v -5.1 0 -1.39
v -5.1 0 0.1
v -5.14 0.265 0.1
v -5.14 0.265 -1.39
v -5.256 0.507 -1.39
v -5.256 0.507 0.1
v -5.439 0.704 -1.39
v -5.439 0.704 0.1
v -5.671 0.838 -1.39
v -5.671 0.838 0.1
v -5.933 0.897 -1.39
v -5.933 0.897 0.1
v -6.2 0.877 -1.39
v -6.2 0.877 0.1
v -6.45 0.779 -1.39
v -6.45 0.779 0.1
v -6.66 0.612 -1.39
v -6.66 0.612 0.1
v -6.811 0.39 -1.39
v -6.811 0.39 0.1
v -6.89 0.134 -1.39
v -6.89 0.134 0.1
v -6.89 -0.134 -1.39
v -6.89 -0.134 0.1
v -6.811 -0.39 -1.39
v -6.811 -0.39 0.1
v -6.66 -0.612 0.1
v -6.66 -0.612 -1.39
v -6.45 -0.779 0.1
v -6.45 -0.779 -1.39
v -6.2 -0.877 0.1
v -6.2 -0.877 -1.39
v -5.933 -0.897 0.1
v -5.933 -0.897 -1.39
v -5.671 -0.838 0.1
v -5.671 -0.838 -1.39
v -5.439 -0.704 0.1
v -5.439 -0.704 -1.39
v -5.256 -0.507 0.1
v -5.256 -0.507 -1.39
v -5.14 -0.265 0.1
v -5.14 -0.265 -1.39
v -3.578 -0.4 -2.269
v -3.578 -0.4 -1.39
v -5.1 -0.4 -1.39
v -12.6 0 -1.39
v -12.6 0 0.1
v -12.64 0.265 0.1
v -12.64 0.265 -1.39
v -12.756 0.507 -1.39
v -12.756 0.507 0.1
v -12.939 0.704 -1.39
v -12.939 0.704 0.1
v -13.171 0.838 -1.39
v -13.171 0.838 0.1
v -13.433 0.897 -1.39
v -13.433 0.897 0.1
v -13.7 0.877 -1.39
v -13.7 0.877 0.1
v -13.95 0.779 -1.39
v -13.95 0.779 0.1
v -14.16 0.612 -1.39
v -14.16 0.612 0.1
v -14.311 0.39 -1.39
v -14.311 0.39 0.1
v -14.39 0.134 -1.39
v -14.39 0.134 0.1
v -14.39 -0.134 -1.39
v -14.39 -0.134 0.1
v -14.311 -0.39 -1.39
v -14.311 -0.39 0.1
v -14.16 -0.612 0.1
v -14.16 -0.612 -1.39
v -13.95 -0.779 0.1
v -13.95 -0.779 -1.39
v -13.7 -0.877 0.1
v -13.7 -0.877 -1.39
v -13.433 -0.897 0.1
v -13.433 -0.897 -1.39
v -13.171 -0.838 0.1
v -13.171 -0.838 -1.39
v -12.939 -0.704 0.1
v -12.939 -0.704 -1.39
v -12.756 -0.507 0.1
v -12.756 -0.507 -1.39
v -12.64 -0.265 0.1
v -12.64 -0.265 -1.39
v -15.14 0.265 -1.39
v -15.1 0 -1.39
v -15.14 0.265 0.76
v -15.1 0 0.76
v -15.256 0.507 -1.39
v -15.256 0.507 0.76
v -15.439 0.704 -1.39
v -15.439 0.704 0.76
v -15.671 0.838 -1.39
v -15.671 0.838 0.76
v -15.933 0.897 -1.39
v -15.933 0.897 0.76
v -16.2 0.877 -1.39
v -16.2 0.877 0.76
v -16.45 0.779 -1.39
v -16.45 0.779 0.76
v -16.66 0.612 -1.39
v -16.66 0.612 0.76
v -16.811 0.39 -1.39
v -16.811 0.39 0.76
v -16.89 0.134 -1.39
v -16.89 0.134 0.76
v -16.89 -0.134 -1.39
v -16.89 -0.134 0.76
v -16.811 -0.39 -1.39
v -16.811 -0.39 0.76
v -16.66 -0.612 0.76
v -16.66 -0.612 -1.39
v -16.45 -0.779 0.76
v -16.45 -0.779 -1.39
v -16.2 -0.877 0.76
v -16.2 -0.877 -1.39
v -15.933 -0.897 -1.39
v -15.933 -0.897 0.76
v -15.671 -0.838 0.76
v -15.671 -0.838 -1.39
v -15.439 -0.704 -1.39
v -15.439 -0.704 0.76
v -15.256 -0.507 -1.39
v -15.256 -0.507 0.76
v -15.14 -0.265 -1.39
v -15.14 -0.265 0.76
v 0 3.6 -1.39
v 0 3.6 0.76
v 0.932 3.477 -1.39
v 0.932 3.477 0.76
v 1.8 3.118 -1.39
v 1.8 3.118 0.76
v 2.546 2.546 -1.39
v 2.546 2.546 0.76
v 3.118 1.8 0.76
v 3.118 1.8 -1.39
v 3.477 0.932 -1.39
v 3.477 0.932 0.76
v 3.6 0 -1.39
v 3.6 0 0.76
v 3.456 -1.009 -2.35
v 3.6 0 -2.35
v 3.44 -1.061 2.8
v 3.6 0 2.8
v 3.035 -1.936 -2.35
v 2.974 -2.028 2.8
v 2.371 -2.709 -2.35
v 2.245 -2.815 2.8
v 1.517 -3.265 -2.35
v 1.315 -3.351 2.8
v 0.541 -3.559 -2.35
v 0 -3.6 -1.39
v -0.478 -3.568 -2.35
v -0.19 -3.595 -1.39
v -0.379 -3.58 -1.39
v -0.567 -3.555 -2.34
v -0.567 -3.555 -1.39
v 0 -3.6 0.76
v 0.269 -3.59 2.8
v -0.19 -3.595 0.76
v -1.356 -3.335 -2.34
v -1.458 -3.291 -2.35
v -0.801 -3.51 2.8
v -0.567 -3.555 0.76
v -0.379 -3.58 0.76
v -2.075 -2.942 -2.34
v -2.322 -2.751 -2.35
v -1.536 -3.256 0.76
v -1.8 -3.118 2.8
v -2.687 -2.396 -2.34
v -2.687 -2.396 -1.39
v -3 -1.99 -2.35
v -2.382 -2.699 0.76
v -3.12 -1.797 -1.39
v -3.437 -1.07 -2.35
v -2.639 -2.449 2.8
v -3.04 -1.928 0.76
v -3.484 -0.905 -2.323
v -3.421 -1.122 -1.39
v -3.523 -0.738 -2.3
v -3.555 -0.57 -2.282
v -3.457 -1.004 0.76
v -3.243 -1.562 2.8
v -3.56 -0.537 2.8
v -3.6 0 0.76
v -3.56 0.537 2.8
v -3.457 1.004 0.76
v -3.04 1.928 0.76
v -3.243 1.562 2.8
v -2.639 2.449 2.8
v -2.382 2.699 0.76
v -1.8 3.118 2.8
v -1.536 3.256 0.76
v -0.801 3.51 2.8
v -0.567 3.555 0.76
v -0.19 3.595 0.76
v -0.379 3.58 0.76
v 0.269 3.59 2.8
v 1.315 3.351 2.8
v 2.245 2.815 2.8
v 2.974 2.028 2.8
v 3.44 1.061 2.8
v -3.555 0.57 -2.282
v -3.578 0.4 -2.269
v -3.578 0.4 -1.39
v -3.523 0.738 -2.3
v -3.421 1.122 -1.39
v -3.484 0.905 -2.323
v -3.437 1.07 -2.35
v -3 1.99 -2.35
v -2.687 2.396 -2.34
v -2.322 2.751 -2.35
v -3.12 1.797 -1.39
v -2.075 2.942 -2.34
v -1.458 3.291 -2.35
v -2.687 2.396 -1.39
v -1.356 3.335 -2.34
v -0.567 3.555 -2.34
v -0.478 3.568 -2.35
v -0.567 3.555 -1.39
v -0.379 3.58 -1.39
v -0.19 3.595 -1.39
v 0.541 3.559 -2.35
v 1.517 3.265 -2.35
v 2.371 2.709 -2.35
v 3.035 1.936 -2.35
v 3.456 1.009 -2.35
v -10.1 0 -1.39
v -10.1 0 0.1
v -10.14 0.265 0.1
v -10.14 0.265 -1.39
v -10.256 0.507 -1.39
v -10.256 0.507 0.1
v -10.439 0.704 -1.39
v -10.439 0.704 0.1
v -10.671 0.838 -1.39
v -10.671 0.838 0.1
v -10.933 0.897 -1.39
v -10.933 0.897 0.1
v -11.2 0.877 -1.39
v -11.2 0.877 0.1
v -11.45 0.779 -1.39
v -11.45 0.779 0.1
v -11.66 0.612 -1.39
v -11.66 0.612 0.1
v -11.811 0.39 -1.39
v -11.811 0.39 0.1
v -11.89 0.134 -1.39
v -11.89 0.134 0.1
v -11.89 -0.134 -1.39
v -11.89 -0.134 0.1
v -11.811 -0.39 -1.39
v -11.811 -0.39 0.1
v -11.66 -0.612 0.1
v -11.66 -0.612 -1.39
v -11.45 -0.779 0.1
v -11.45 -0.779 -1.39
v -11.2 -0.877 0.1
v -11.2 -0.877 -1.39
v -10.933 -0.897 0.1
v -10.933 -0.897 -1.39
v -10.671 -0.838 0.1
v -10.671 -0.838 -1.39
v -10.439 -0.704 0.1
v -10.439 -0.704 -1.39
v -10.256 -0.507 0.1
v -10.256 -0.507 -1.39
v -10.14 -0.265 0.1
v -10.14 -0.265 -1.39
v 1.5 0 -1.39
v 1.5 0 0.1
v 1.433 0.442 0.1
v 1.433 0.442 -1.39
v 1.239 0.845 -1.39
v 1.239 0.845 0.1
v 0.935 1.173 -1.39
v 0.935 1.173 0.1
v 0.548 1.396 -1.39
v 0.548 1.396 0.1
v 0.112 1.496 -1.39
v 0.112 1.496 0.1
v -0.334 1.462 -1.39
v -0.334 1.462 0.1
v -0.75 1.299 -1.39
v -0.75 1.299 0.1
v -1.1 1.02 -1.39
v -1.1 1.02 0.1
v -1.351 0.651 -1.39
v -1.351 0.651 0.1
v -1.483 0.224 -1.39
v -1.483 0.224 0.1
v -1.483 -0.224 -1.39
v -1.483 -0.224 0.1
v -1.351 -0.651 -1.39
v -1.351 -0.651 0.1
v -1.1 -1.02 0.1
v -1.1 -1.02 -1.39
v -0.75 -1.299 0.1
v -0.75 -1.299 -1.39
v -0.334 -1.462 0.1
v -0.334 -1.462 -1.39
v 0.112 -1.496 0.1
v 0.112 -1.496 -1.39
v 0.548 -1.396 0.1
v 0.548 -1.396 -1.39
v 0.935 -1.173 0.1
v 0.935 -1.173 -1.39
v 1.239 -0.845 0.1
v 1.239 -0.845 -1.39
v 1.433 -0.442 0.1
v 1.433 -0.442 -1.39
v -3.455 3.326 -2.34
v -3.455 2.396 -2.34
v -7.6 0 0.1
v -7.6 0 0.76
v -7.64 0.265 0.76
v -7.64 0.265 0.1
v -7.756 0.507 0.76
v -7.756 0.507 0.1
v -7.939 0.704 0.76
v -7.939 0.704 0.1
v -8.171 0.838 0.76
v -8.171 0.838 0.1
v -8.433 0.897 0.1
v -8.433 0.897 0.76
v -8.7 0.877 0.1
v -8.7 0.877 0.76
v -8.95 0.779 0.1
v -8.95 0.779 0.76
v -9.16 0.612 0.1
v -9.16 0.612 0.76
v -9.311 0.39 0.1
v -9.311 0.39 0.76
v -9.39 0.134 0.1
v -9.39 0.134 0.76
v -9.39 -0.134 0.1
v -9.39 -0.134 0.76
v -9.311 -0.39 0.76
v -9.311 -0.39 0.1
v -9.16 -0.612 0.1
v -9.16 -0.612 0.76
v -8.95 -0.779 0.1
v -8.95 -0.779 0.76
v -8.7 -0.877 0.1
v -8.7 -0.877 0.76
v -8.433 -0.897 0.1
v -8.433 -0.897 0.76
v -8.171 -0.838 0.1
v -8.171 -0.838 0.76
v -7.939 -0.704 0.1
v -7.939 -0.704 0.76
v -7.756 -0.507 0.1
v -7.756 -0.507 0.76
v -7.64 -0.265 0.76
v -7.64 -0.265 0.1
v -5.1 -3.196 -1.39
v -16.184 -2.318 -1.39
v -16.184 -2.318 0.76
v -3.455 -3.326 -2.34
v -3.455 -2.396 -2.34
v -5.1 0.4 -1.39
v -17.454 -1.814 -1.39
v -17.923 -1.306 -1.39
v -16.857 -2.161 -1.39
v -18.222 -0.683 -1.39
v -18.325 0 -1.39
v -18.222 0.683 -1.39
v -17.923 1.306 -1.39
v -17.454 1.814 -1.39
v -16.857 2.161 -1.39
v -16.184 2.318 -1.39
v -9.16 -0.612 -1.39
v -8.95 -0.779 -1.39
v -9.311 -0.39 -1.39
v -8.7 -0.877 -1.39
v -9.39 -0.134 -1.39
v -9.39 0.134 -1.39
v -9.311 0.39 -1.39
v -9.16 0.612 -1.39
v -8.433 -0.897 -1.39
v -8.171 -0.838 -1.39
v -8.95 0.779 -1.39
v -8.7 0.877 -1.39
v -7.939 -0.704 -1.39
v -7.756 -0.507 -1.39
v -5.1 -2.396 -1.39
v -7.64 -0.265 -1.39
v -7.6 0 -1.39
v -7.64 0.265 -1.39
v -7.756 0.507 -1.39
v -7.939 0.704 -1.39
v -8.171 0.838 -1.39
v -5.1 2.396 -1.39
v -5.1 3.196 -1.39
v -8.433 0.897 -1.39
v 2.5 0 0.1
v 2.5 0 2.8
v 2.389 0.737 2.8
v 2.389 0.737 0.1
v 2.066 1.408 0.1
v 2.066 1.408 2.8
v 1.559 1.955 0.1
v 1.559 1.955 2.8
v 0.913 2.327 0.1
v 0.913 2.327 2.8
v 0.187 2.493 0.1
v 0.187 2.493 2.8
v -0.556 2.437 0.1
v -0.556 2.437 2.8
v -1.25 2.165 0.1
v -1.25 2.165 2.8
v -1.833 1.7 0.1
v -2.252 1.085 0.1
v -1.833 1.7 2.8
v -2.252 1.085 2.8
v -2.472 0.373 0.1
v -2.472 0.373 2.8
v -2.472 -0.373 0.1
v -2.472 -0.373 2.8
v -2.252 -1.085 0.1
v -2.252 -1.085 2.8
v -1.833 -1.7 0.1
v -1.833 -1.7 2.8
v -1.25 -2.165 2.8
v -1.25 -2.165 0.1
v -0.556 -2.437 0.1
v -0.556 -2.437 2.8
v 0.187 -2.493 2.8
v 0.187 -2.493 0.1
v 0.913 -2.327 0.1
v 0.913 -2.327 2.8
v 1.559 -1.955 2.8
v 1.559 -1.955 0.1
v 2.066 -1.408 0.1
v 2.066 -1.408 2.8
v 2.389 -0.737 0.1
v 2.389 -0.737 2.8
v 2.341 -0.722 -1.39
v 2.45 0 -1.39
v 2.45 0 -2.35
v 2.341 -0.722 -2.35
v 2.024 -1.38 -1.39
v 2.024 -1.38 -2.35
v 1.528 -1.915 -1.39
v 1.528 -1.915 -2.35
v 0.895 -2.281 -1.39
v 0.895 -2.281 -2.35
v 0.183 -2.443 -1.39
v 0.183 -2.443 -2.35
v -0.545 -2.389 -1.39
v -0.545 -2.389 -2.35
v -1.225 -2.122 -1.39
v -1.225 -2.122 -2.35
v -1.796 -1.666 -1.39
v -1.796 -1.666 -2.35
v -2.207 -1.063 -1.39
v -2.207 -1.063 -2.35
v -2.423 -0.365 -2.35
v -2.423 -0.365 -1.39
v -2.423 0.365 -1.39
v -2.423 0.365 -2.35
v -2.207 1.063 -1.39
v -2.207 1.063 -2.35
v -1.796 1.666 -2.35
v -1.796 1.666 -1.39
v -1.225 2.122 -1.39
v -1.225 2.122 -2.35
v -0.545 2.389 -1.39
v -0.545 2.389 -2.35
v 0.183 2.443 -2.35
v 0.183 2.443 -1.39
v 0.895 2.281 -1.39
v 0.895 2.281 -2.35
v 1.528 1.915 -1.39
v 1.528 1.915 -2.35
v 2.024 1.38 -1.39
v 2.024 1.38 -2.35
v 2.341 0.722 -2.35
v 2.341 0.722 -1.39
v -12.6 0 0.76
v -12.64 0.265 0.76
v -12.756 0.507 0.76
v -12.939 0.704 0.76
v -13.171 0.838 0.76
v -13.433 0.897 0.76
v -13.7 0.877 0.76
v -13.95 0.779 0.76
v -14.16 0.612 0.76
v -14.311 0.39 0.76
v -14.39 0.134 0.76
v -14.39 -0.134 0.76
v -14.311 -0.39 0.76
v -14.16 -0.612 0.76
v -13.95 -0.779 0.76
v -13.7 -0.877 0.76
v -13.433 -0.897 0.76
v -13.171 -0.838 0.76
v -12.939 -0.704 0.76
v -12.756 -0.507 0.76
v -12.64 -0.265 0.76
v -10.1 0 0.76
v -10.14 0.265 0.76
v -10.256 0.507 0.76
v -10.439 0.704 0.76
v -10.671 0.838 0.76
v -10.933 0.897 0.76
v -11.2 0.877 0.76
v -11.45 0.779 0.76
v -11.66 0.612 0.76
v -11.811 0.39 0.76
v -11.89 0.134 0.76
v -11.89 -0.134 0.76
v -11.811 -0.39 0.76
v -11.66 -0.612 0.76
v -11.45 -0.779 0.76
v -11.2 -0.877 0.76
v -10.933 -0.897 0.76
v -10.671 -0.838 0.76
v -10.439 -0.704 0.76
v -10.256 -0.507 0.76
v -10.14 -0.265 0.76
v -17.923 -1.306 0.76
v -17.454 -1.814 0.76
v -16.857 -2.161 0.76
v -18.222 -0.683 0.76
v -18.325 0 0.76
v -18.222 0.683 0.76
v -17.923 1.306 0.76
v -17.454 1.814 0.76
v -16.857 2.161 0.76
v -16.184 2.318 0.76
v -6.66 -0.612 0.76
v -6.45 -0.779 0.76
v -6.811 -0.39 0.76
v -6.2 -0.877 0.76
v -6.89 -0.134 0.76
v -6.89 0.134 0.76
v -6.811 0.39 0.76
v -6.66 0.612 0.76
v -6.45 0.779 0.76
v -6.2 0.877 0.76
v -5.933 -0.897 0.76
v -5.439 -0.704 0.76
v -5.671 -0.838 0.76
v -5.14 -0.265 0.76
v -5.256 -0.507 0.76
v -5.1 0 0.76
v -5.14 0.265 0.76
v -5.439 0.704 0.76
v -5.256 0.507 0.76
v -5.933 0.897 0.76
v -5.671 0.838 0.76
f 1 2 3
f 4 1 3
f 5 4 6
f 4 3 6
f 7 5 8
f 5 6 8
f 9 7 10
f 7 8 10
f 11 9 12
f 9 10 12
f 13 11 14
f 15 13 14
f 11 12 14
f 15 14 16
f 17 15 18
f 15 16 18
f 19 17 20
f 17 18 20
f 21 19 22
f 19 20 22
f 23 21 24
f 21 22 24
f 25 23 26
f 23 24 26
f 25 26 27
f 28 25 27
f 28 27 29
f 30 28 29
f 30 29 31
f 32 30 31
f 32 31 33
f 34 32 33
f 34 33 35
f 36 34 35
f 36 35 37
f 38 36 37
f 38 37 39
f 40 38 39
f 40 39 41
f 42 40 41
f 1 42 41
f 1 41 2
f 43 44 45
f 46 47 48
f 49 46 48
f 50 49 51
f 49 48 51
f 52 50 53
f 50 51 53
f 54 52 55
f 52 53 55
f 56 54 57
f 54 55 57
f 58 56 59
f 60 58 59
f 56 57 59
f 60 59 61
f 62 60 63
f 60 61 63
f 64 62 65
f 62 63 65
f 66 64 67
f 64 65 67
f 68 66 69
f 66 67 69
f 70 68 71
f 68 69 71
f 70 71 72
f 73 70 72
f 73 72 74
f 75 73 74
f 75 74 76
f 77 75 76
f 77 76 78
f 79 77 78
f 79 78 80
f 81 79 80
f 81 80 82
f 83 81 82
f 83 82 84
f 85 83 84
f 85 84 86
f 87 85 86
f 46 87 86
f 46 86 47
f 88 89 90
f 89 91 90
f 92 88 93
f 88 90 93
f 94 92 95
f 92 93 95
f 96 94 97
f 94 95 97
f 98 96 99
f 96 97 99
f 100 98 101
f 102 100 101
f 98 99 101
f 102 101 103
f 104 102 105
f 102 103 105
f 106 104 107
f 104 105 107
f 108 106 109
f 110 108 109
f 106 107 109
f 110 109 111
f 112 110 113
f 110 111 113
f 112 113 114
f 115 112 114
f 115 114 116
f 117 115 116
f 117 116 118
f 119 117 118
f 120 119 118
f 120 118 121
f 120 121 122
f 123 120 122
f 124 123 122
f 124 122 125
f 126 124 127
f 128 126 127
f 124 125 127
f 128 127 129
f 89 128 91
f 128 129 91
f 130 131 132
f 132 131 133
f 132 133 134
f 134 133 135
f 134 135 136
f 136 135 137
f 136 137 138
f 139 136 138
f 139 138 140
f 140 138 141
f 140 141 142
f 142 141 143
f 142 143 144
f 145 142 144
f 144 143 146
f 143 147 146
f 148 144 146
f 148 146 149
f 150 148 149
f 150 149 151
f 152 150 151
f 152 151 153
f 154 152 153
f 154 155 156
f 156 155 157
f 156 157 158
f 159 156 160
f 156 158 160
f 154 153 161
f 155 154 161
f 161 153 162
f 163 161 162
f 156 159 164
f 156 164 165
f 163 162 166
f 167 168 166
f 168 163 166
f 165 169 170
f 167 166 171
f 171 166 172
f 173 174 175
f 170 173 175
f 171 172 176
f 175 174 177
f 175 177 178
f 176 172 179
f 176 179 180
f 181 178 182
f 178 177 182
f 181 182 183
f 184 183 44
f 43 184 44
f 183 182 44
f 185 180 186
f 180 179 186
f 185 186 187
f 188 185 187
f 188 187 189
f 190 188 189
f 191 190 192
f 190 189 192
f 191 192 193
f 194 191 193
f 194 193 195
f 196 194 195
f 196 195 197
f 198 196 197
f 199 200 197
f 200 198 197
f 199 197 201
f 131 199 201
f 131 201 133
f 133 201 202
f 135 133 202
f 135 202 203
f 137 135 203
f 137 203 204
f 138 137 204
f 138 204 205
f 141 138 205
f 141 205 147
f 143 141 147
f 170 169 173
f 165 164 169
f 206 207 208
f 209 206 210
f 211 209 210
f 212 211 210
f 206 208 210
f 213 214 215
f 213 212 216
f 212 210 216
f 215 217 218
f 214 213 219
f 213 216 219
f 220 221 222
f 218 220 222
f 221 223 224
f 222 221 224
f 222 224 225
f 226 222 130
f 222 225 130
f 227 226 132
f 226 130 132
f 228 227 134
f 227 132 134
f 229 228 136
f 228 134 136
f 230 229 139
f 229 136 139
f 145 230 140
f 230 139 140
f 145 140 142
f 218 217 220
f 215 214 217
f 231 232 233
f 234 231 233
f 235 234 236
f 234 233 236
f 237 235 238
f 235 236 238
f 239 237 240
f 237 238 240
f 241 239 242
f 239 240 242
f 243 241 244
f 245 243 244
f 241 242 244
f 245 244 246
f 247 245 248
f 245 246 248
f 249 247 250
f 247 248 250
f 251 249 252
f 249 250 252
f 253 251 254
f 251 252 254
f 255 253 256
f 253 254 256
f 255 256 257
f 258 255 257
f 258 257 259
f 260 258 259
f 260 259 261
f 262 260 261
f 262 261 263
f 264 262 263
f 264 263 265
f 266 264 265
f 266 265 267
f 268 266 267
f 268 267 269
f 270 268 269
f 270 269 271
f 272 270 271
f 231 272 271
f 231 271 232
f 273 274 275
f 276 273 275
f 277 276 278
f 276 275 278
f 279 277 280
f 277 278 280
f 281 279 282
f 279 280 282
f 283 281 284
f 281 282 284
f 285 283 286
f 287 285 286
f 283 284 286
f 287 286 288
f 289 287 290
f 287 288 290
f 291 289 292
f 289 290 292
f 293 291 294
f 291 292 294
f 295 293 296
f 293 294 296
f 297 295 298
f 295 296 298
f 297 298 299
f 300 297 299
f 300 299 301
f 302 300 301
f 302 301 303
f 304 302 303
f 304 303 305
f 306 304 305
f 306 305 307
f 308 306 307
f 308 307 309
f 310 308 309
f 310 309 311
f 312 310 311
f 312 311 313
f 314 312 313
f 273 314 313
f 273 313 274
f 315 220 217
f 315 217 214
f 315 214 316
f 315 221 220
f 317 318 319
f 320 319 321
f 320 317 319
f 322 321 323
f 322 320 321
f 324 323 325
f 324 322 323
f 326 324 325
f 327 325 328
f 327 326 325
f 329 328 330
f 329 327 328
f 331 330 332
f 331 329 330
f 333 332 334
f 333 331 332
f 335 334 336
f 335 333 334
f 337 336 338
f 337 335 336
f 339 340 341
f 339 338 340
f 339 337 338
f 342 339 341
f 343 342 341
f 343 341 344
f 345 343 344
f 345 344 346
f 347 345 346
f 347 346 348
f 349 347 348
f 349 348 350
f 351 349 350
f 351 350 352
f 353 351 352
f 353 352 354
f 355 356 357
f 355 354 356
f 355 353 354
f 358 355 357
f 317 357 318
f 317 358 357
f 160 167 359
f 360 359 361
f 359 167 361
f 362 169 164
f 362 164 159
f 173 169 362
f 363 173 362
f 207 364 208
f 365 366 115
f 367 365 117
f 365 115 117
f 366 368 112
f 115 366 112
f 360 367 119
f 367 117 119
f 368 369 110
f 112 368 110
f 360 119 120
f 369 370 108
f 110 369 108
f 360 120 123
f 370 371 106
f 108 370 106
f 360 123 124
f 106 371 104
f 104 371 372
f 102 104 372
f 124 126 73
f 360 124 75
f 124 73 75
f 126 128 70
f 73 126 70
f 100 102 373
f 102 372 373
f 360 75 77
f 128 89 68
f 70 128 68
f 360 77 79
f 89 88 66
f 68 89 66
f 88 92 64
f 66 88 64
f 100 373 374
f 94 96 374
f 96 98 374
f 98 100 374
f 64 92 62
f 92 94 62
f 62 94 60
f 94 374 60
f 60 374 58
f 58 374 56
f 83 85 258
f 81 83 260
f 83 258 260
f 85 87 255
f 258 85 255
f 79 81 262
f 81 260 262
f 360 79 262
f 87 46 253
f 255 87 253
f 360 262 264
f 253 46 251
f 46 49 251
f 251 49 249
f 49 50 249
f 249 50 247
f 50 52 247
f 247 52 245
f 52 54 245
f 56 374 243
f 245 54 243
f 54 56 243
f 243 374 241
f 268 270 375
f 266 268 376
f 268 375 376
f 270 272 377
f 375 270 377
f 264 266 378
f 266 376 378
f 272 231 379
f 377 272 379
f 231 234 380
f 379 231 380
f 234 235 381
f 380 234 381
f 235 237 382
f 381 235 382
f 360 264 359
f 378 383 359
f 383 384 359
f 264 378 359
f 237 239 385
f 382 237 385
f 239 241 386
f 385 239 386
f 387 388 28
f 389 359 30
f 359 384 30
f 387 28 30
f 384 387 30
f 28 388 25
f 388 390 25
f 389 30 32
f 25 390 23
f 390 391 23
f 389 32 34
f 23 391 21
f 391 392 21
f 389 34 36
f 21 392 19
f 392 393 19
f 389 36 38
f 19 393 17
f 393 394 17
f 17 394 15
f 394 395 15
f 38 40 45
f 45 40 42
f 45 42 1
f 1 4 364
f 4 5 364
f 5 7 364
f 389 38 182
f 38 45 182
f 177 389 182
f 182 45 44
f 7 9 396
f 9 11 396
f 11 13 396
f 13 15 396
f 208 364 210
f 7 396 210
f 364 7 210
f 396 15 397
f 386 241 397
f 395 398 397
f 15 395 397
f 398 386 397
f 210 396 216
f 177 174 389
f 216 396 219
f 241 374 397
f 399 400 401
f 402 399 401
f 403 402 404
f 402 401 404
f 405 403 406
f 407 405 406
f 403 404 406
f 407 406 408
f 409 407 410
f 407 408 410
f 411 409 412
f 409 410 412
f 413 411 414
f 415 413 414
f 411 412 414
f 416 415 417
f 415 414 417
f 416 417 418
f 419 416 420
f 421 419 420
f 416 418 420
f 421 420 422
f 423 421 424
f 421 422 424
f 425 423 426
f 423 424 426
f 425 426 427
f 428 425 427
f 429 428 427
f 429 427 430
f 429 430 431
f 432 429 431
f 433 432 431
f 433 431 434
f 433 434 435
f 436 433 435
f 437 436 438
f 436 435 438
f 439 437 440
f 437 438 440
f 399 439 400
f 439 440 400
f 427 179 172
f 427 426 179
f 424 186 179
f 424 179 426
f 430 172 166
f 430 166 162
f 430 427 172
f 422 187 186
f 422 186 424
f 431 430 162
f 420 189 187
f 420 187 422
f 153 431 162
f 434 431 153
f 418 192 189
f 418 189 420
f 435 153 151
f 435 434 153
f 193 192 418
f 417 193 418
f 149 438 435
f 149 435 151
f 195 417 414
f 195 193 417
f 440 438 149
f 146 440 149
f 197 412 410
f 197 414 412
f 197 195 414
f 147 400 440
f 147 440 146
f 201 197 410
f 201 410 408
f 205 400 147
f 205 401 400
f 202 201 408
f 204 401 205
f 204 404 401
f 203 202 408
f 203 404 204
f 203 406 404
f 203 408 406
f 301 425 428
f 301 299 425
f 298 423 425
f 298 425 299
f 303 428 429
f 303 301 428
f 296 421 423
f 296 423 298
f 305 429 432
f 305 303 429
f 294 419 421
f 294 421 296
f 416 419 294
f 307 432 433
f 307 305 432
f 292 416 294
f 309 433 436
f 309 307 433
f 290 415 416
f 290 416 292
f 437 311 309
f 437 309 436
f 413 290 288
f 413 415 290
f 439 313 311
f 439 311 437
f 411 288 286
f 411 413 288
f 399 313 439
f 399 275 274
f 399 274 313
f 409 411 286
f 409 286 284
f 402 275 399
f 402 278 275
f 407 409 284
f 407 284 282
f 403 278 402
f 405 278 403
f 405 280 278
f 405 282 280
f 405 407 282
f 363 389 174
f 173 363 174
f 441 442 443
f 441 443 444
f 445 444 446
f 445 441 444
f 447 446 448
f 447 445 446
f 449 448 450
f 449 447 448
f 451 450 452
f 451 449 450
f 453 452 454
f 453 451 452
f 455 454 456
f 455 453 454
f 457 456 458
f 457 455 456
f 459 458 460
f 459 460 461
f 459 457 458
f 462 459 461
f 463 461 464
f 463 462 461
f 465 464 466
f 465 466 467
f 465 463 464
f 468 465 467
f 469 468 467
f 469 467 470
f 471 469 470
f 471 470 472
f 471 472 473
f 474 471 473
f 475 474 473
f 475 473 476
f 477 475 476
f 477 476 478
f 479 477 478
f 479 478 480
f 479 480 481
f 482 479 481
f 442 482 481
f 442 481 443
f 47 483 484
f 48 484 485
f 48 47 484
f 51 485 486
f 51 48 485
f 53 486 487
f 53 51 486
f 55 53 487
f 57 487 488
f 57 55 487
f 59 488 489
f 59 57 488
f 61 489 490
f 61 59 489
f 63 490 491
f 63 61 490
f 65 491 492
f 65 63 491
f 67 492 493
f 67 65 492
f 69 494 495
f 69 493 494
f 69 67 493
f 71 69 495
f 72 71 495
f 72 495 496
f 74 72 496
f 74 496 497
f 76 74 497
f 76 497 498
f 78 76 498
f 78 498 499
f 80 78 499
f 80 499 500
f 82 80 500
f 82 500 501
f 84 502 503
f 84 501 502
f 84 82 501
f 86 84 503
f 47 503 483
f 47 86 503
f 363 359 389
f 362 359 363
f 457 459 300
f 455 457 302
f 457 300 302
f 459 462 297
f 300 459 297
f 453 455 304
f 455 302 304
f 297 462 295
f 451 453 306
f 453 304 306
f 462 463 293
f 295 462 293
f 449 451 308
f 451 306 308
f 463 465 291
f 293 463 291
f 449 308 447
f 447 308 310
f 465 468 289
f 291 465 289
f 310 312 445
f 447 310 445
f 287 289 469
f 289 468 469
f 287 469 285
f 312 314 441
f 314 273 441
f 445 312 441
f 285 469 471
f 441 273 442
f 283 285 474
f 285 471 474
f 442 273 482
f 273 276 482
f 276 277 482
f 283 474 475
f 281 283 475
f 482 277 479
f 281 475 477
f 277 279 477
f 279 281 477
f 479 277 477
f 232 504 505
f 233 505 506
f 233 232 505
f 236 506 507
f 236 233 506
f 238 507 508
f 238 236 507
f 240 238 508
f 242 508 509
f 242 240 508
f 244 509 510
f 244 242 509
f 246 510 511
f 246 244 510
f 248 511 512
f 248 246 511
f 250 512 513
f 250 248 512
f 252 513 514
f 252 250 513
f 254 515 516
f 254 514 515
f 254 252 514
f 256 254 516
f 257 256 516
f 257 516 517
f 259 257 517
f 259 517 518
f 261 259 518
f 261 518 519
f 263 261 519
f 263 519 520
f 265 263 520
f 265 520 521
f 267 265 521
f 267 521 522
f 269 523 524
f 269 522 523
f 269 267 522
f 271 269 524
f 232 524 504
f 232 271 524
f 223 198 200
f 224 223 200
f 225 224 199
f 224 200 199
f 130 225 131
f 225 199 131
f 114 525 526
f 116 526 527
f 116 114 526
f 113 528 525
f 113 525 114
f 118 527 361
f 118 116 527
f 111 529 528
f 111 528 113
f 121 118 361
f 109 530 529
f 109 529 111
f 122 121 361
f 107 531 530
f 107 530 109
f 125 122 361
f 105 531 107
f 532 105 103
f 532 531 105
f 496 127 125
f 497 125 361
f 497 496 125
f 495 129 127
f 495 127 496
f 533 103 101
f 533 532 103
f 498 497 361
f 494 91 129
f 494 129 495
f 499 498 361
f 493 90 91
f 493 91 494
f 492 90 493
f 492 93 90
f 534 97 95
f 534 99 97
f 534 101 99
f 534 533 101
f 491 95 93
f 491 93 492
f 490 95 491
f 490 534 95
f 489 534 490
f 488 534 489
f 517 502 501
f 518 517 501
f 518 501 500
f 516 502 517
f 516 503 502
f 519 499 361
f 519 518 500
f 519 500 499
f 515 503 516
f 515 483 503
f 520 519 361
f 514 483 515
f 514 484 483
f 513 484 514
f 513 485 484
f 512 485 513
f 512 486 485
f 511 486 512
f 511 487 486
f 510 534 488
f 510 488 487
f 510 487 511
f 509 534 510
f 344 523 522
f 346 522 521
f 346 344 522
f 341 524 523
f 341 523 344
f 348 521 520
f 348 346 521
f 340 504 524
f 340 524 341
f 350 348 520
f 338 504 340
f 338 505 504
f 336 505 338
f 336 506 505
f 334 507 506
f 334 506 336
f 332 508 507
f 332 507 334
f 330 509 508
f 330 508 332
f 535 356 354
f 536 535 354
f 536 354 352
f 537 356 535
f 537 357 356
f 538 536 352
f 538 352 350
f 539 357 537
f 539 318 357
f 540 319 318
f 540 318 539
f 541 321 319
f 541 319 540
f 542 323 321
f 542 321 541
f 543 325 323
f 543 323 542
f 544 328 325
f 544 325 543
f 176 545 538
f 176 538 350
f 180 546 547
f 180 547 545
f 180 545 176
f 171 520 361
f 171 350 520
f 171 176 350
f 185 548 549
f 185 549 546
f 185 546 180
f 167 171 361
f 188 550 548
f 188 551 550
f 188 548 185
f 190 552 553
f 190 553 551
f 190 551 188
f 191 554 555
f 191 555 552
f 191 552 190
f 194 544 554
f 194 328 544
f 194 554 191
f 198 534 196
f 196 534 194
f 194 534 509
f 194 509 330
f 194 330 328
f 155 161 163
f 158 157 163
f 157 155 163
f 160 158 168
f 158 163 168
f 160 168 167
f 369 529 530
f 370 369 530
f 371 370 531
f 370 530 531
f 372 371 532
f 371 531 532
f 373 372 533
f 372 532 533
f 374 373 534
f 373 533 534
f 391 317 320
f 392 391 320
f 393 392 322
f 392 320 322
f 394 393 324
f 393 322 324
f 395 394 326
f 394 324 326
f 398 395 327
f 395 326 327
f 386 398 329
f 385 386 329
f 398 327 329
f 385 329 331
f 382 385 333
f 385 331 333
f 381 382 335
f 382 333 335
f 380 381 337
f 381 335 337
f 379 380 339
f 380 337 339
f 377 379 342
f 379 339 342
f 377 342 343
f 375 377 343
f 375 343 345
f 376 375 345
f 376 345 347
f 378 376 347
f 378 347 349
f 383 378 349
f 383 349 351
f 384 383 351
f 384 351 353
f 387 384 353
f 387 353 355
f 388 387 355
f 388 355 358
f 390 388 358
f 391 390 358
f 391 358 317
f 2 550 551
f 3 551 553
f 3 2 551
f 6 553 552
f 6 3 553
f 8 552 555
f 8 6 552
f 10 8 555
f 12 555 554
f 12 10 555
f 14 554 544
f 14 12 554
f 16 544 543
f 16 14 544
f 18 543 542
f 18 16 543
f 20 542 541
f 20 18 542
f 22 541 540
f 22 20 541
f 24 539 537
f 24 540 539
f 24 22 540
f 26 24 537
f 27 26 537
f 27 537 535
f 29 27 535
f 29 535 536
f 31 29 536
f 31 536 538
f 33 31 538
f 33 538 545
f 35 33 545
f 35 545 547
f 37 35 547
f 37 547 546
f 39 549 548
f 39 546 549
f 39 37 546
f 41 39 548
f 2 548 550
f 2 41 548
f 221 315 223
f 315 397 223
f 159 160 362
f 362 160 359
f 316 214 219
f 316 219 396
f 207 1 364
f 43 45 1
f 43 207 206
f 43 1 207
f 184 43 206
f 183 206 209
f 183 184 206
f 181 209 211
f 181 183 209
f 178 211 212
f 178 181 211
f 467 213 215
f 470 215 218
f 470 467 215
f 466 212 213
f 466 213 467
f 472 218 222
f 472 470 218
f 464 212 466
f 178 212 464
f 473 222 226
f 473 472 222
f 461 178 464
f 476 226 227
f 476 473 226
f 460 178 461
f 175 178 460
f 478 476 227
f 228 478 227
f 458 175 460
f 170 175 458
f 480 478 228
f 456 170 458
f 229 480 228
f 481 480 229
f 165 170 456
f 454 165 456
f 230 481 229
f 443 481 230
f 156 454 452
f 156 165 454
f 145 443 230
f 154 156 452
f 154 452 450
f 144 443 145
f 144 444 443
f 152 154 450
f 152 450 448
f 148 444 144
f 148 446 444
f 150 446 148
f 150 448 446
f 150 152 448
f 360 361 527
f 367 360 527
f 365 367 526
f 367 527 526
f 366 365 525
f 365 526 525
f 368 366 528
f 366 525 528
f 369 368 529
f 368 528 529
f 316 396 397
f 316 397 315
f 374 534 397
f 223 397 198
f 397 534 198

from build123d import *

# Parameters (mm, degrees)
RESSALTO_EXTRUS_O1_DEPTH      = 2.8
RESSALTO_EXTRUS_O1_DEPTH_BACK = 0.15
ESBO_O1_R                     = 3.6
ESBO_O1_R_2                   = 2.45
ESBO_O2_R                     = 2.5
ESBO_O2_R_2                   = 1
RESSALTO_EXTRUS_O2_DEPTH      = 0.5
ESBO_O3_R                     = 3.6
ESBO_O3_R_2                   = 2.45
RESSALTO_EXTRUS_O3_DEPTH      = 2.2
ESBO_O4_W                     = 22
ESBO_O4_H                     = 2.15
RESSALTO_EXTRUS_O4_DEPTH      = 3.6
CORTE_EXTRUS_O2_DEPTH         = 7.2
ESBO_O7_R                     = 2.5
CORTE_EXTRUS_O3_DEPTH         = 2.7
ESBO_O8_R                     = 1.5
ESBO_O8_R_2                   = 0.9
CORTE_EXTRUS_O4_DEPTH         = 6.9
RESSALTO_EXTRUS_O5_DEPTH      = 0.95
CORTE_EXTRUS_O5_DEPTH         = 12
CORTE_EXTRUS_O5_DEPTH_BACK    = 4.95


with BuildPart() as part:
    # Esboço1 → Ressalto-extrusão1 (new, two sides: drawn at the far end of the back side and taken through both)
    with BuildSketch(Plane.XY.offset(-RESSALTO_EXTRUS_O1_DEPTH_BACK)):
        Circle(ESBO_O1_R)
        Circle(ESBO_O1_R_2, mode=Mode.SUBTRACT)
    extrude(amount=RESSALTO_EXTRUS_O1_DEPTH + RESSALTO_EXTRUS_O1_DEPTH_BACK)



with BuildPart() as body_2:
    # Esboço2 → Ressalto-extrusão2 (new body)
    with BuildSketch(Plane(origin=(0, 0, -0.15), x_dir=(-1, 0, 0), z_dir=(0, 0, -1))):
        Circle(ESBO_O2_R)
        Circle(ESBO_O2_R_2, mode=Mode.SUBTRACT)
    extrude(amount=RESSALTO_EXTRUS_O2_DEPTH)


with BuildPart() as part_1:
    add(part.part)

    add(body_2.part)  # Ressalto-extrusão3 merges body 2
    # Esboço3 → Ressalto-extrusão3 (add)
    with BuildSketch(Plane(origin=(0, 0, -0.15), x_dir=(-1, 0, 0), z_dir=(0, 0, -1))):
        with Locations(Location((0, 0, 0), (0, 0, 180))):
            Circle(ESBO_O3_R)
        with Locations(Location((0, 0, 0), (0, 0, 180))):
            Circle(ESBO_O3_R_2, mode=Mode.SUBTRACT)
    extrude(amount=RESSALTO_EXTRUS_O3_DEPTH)

    # Esboço4 → Ressalto-extrusão4 (add, symmetric)
    with BuildSketch(Plane(origin=(0, 0, 0), x_dir=(1, 0, 0), z_dir=(0, 1, 0))):
        with Locations((-7.325, 0.315)):
            Rectangle(ESBO_O4_W, ESBO_O4_H)
    extrude(amount=RESSALTO_EXTRUS_O4_DEPTH, both=True)

    # Esboço5 → Corte-extrusão2 (cut)
    with BuildSketch(Plane.XY.offset(0.76)):
        with BuildLine():
            ThreePointArc((0, -3.6), (-0.28434443, -3.588753021), (-0.566912184, -3.555082358))
            Line((-0.566912184, -3.555082358), (-16.183639111, -2.317736326))
            ThreePointArc((-16.183639111, -2.317736326), (-17.70771571, -1.577761723), (-18.325, -1.7e-08))
            Line((-18.325, -1.7e-08), (-18.325, -3.6))
            Line((-18.325, -3.6), (0, -3.6))
        make_face()
        with BuildLine():
            ThreePointArc((0, 3.6), (3.6, 0), (0, -3.6))
            Line((0, -3.6), (3.675, -3.6))
            Line((3.675, -3.6), (3.675, 3.6))
            Line((3.675, 3.6), (0, 3.6))
        make_face()
        with BuildLine():
            Line((-16.183639111, 2.317736326), (-0.566912184, 3.555082358))
            ThreePointArc((-0.566912184, 3.555082358), (-0.28434443, 3.588753021), (0, 3.6))
            Line((0, 3.6), (-18.325, 3.6))
            Line((-18.325, 3.6), (-18.325, -1.7e-08))
            ThreePointArc((-18.325, -1.7e-08), (-17.707715722, 1.57776171), (-16.183639111, 2.317736326))
        make_face()
    extrude(amount=-CORTE_EXTRUS_O2_DEPTH, mode=Mode.SUBTRACT)

    # Esboço7 → Corte-extrusão3 (cut)
    with BuildSketch(Plane.XY.offset(2.8)):
        Circle(ESBO_O7_R)
    extrude(amount=-CORTE_EXTRUS_O3_DEPTH, mode=Mode.SUBTRACT)

    # Esboço8 → Corte-extrusão4 (cut, symmetric)
    with BuildSketch(Plane.XY.offset(0.1)):
        Circle(ESBO_O8_R)
        with Locations((-6, 0)):
            Circle(ESBO_O8_R_2)
        with Locations((-8.5, 0)):
            Circle(ESBO_O8_R_2)
        with Locations((-11, 0)):
            Circle(ESBO_O8_R_2)
        with Locations((-13.5, 0)):
            Circle(ESBO_O8_R_2)
        with Locations((-16, 0)):
            Circle(ESBO_O8_R_2)
    extrude(amount=CORTE_EXTRUS_O4_DEPTH, both=True, mode=Mode.SUBTRACT)

    # Esboço10 → Ressalto-extrusão5 (add)
    with BuildSketch(Plane(origin=(0, 0, -1.39), x_dir=(-1, 0, 0), z_dir=(0, 0, -1))):
        with BuildLine():
            Line((0.566912184, -3.555082358), (5.1, -3.195916302))
            Line((5.1, -3.195916302), (5.1, -2.395916302))
            Line((5.1, -2.395916302), (2.686928558, -2.395916302))
            ThreePointArc((2.686928558, -2.395916302), (1.727074515, -3.158672763), (0.566912184, -3.555082358))
        make_face()
        with BuildLine():
            ThreePointArc((3.577708764, 0.4), (3.6, 0), (3.577708764, -0.4))
            Line((3.577708764, -0.4), (5.193774225, -0.4))
            ThreePointArc((5.193774225, -0.4), (5.1, 0), (5.193774225, 0.4))
            Line((5.193774225, 0.4), (3.577708764, 0.4))
        make_face()
        with BuildLine():
            ThreePointArc((0.566912184, 3.555082358), (1.727074515, 3.158672763), (2.686928558, 2.395916302))
            Line((2.686928558, 2.395916302), (5.1, 2.395916302))
            Line((5.1, 2.395916302), (5.1, 3.195916302))
            Line((5.1, 3.195916302), (0.566912184, 3.555082358))
        make_face()
    extrude(amount=RESSALTO_EXTRUS_O5_DEPTH)

    # Esboço11 → Corte-extrusão5 (cut, two sides: drawn at the far end of the back side and taken through both)
    with BuildSketch(Plane(origin=(0, 0, 0), x_dir=(1, 0, 0), z_dir=(0, 1, 0)).offset(-CORTE_EXTRUS_O5_DEPTH_BACK)):
        Polygon((-5.1, 1.39), (-2.045555334, 3.15348445), (-5.859008957, 3.15348445), (-5.859008957, 1.39), align=None)
    extrude(amount=CORTE_EXTRUS_O5_DEPTH + CORTE_EXTRUS_O5_DEPTH_BACK, mode=Mode.SUBTRACT)


solid = part_1.part
